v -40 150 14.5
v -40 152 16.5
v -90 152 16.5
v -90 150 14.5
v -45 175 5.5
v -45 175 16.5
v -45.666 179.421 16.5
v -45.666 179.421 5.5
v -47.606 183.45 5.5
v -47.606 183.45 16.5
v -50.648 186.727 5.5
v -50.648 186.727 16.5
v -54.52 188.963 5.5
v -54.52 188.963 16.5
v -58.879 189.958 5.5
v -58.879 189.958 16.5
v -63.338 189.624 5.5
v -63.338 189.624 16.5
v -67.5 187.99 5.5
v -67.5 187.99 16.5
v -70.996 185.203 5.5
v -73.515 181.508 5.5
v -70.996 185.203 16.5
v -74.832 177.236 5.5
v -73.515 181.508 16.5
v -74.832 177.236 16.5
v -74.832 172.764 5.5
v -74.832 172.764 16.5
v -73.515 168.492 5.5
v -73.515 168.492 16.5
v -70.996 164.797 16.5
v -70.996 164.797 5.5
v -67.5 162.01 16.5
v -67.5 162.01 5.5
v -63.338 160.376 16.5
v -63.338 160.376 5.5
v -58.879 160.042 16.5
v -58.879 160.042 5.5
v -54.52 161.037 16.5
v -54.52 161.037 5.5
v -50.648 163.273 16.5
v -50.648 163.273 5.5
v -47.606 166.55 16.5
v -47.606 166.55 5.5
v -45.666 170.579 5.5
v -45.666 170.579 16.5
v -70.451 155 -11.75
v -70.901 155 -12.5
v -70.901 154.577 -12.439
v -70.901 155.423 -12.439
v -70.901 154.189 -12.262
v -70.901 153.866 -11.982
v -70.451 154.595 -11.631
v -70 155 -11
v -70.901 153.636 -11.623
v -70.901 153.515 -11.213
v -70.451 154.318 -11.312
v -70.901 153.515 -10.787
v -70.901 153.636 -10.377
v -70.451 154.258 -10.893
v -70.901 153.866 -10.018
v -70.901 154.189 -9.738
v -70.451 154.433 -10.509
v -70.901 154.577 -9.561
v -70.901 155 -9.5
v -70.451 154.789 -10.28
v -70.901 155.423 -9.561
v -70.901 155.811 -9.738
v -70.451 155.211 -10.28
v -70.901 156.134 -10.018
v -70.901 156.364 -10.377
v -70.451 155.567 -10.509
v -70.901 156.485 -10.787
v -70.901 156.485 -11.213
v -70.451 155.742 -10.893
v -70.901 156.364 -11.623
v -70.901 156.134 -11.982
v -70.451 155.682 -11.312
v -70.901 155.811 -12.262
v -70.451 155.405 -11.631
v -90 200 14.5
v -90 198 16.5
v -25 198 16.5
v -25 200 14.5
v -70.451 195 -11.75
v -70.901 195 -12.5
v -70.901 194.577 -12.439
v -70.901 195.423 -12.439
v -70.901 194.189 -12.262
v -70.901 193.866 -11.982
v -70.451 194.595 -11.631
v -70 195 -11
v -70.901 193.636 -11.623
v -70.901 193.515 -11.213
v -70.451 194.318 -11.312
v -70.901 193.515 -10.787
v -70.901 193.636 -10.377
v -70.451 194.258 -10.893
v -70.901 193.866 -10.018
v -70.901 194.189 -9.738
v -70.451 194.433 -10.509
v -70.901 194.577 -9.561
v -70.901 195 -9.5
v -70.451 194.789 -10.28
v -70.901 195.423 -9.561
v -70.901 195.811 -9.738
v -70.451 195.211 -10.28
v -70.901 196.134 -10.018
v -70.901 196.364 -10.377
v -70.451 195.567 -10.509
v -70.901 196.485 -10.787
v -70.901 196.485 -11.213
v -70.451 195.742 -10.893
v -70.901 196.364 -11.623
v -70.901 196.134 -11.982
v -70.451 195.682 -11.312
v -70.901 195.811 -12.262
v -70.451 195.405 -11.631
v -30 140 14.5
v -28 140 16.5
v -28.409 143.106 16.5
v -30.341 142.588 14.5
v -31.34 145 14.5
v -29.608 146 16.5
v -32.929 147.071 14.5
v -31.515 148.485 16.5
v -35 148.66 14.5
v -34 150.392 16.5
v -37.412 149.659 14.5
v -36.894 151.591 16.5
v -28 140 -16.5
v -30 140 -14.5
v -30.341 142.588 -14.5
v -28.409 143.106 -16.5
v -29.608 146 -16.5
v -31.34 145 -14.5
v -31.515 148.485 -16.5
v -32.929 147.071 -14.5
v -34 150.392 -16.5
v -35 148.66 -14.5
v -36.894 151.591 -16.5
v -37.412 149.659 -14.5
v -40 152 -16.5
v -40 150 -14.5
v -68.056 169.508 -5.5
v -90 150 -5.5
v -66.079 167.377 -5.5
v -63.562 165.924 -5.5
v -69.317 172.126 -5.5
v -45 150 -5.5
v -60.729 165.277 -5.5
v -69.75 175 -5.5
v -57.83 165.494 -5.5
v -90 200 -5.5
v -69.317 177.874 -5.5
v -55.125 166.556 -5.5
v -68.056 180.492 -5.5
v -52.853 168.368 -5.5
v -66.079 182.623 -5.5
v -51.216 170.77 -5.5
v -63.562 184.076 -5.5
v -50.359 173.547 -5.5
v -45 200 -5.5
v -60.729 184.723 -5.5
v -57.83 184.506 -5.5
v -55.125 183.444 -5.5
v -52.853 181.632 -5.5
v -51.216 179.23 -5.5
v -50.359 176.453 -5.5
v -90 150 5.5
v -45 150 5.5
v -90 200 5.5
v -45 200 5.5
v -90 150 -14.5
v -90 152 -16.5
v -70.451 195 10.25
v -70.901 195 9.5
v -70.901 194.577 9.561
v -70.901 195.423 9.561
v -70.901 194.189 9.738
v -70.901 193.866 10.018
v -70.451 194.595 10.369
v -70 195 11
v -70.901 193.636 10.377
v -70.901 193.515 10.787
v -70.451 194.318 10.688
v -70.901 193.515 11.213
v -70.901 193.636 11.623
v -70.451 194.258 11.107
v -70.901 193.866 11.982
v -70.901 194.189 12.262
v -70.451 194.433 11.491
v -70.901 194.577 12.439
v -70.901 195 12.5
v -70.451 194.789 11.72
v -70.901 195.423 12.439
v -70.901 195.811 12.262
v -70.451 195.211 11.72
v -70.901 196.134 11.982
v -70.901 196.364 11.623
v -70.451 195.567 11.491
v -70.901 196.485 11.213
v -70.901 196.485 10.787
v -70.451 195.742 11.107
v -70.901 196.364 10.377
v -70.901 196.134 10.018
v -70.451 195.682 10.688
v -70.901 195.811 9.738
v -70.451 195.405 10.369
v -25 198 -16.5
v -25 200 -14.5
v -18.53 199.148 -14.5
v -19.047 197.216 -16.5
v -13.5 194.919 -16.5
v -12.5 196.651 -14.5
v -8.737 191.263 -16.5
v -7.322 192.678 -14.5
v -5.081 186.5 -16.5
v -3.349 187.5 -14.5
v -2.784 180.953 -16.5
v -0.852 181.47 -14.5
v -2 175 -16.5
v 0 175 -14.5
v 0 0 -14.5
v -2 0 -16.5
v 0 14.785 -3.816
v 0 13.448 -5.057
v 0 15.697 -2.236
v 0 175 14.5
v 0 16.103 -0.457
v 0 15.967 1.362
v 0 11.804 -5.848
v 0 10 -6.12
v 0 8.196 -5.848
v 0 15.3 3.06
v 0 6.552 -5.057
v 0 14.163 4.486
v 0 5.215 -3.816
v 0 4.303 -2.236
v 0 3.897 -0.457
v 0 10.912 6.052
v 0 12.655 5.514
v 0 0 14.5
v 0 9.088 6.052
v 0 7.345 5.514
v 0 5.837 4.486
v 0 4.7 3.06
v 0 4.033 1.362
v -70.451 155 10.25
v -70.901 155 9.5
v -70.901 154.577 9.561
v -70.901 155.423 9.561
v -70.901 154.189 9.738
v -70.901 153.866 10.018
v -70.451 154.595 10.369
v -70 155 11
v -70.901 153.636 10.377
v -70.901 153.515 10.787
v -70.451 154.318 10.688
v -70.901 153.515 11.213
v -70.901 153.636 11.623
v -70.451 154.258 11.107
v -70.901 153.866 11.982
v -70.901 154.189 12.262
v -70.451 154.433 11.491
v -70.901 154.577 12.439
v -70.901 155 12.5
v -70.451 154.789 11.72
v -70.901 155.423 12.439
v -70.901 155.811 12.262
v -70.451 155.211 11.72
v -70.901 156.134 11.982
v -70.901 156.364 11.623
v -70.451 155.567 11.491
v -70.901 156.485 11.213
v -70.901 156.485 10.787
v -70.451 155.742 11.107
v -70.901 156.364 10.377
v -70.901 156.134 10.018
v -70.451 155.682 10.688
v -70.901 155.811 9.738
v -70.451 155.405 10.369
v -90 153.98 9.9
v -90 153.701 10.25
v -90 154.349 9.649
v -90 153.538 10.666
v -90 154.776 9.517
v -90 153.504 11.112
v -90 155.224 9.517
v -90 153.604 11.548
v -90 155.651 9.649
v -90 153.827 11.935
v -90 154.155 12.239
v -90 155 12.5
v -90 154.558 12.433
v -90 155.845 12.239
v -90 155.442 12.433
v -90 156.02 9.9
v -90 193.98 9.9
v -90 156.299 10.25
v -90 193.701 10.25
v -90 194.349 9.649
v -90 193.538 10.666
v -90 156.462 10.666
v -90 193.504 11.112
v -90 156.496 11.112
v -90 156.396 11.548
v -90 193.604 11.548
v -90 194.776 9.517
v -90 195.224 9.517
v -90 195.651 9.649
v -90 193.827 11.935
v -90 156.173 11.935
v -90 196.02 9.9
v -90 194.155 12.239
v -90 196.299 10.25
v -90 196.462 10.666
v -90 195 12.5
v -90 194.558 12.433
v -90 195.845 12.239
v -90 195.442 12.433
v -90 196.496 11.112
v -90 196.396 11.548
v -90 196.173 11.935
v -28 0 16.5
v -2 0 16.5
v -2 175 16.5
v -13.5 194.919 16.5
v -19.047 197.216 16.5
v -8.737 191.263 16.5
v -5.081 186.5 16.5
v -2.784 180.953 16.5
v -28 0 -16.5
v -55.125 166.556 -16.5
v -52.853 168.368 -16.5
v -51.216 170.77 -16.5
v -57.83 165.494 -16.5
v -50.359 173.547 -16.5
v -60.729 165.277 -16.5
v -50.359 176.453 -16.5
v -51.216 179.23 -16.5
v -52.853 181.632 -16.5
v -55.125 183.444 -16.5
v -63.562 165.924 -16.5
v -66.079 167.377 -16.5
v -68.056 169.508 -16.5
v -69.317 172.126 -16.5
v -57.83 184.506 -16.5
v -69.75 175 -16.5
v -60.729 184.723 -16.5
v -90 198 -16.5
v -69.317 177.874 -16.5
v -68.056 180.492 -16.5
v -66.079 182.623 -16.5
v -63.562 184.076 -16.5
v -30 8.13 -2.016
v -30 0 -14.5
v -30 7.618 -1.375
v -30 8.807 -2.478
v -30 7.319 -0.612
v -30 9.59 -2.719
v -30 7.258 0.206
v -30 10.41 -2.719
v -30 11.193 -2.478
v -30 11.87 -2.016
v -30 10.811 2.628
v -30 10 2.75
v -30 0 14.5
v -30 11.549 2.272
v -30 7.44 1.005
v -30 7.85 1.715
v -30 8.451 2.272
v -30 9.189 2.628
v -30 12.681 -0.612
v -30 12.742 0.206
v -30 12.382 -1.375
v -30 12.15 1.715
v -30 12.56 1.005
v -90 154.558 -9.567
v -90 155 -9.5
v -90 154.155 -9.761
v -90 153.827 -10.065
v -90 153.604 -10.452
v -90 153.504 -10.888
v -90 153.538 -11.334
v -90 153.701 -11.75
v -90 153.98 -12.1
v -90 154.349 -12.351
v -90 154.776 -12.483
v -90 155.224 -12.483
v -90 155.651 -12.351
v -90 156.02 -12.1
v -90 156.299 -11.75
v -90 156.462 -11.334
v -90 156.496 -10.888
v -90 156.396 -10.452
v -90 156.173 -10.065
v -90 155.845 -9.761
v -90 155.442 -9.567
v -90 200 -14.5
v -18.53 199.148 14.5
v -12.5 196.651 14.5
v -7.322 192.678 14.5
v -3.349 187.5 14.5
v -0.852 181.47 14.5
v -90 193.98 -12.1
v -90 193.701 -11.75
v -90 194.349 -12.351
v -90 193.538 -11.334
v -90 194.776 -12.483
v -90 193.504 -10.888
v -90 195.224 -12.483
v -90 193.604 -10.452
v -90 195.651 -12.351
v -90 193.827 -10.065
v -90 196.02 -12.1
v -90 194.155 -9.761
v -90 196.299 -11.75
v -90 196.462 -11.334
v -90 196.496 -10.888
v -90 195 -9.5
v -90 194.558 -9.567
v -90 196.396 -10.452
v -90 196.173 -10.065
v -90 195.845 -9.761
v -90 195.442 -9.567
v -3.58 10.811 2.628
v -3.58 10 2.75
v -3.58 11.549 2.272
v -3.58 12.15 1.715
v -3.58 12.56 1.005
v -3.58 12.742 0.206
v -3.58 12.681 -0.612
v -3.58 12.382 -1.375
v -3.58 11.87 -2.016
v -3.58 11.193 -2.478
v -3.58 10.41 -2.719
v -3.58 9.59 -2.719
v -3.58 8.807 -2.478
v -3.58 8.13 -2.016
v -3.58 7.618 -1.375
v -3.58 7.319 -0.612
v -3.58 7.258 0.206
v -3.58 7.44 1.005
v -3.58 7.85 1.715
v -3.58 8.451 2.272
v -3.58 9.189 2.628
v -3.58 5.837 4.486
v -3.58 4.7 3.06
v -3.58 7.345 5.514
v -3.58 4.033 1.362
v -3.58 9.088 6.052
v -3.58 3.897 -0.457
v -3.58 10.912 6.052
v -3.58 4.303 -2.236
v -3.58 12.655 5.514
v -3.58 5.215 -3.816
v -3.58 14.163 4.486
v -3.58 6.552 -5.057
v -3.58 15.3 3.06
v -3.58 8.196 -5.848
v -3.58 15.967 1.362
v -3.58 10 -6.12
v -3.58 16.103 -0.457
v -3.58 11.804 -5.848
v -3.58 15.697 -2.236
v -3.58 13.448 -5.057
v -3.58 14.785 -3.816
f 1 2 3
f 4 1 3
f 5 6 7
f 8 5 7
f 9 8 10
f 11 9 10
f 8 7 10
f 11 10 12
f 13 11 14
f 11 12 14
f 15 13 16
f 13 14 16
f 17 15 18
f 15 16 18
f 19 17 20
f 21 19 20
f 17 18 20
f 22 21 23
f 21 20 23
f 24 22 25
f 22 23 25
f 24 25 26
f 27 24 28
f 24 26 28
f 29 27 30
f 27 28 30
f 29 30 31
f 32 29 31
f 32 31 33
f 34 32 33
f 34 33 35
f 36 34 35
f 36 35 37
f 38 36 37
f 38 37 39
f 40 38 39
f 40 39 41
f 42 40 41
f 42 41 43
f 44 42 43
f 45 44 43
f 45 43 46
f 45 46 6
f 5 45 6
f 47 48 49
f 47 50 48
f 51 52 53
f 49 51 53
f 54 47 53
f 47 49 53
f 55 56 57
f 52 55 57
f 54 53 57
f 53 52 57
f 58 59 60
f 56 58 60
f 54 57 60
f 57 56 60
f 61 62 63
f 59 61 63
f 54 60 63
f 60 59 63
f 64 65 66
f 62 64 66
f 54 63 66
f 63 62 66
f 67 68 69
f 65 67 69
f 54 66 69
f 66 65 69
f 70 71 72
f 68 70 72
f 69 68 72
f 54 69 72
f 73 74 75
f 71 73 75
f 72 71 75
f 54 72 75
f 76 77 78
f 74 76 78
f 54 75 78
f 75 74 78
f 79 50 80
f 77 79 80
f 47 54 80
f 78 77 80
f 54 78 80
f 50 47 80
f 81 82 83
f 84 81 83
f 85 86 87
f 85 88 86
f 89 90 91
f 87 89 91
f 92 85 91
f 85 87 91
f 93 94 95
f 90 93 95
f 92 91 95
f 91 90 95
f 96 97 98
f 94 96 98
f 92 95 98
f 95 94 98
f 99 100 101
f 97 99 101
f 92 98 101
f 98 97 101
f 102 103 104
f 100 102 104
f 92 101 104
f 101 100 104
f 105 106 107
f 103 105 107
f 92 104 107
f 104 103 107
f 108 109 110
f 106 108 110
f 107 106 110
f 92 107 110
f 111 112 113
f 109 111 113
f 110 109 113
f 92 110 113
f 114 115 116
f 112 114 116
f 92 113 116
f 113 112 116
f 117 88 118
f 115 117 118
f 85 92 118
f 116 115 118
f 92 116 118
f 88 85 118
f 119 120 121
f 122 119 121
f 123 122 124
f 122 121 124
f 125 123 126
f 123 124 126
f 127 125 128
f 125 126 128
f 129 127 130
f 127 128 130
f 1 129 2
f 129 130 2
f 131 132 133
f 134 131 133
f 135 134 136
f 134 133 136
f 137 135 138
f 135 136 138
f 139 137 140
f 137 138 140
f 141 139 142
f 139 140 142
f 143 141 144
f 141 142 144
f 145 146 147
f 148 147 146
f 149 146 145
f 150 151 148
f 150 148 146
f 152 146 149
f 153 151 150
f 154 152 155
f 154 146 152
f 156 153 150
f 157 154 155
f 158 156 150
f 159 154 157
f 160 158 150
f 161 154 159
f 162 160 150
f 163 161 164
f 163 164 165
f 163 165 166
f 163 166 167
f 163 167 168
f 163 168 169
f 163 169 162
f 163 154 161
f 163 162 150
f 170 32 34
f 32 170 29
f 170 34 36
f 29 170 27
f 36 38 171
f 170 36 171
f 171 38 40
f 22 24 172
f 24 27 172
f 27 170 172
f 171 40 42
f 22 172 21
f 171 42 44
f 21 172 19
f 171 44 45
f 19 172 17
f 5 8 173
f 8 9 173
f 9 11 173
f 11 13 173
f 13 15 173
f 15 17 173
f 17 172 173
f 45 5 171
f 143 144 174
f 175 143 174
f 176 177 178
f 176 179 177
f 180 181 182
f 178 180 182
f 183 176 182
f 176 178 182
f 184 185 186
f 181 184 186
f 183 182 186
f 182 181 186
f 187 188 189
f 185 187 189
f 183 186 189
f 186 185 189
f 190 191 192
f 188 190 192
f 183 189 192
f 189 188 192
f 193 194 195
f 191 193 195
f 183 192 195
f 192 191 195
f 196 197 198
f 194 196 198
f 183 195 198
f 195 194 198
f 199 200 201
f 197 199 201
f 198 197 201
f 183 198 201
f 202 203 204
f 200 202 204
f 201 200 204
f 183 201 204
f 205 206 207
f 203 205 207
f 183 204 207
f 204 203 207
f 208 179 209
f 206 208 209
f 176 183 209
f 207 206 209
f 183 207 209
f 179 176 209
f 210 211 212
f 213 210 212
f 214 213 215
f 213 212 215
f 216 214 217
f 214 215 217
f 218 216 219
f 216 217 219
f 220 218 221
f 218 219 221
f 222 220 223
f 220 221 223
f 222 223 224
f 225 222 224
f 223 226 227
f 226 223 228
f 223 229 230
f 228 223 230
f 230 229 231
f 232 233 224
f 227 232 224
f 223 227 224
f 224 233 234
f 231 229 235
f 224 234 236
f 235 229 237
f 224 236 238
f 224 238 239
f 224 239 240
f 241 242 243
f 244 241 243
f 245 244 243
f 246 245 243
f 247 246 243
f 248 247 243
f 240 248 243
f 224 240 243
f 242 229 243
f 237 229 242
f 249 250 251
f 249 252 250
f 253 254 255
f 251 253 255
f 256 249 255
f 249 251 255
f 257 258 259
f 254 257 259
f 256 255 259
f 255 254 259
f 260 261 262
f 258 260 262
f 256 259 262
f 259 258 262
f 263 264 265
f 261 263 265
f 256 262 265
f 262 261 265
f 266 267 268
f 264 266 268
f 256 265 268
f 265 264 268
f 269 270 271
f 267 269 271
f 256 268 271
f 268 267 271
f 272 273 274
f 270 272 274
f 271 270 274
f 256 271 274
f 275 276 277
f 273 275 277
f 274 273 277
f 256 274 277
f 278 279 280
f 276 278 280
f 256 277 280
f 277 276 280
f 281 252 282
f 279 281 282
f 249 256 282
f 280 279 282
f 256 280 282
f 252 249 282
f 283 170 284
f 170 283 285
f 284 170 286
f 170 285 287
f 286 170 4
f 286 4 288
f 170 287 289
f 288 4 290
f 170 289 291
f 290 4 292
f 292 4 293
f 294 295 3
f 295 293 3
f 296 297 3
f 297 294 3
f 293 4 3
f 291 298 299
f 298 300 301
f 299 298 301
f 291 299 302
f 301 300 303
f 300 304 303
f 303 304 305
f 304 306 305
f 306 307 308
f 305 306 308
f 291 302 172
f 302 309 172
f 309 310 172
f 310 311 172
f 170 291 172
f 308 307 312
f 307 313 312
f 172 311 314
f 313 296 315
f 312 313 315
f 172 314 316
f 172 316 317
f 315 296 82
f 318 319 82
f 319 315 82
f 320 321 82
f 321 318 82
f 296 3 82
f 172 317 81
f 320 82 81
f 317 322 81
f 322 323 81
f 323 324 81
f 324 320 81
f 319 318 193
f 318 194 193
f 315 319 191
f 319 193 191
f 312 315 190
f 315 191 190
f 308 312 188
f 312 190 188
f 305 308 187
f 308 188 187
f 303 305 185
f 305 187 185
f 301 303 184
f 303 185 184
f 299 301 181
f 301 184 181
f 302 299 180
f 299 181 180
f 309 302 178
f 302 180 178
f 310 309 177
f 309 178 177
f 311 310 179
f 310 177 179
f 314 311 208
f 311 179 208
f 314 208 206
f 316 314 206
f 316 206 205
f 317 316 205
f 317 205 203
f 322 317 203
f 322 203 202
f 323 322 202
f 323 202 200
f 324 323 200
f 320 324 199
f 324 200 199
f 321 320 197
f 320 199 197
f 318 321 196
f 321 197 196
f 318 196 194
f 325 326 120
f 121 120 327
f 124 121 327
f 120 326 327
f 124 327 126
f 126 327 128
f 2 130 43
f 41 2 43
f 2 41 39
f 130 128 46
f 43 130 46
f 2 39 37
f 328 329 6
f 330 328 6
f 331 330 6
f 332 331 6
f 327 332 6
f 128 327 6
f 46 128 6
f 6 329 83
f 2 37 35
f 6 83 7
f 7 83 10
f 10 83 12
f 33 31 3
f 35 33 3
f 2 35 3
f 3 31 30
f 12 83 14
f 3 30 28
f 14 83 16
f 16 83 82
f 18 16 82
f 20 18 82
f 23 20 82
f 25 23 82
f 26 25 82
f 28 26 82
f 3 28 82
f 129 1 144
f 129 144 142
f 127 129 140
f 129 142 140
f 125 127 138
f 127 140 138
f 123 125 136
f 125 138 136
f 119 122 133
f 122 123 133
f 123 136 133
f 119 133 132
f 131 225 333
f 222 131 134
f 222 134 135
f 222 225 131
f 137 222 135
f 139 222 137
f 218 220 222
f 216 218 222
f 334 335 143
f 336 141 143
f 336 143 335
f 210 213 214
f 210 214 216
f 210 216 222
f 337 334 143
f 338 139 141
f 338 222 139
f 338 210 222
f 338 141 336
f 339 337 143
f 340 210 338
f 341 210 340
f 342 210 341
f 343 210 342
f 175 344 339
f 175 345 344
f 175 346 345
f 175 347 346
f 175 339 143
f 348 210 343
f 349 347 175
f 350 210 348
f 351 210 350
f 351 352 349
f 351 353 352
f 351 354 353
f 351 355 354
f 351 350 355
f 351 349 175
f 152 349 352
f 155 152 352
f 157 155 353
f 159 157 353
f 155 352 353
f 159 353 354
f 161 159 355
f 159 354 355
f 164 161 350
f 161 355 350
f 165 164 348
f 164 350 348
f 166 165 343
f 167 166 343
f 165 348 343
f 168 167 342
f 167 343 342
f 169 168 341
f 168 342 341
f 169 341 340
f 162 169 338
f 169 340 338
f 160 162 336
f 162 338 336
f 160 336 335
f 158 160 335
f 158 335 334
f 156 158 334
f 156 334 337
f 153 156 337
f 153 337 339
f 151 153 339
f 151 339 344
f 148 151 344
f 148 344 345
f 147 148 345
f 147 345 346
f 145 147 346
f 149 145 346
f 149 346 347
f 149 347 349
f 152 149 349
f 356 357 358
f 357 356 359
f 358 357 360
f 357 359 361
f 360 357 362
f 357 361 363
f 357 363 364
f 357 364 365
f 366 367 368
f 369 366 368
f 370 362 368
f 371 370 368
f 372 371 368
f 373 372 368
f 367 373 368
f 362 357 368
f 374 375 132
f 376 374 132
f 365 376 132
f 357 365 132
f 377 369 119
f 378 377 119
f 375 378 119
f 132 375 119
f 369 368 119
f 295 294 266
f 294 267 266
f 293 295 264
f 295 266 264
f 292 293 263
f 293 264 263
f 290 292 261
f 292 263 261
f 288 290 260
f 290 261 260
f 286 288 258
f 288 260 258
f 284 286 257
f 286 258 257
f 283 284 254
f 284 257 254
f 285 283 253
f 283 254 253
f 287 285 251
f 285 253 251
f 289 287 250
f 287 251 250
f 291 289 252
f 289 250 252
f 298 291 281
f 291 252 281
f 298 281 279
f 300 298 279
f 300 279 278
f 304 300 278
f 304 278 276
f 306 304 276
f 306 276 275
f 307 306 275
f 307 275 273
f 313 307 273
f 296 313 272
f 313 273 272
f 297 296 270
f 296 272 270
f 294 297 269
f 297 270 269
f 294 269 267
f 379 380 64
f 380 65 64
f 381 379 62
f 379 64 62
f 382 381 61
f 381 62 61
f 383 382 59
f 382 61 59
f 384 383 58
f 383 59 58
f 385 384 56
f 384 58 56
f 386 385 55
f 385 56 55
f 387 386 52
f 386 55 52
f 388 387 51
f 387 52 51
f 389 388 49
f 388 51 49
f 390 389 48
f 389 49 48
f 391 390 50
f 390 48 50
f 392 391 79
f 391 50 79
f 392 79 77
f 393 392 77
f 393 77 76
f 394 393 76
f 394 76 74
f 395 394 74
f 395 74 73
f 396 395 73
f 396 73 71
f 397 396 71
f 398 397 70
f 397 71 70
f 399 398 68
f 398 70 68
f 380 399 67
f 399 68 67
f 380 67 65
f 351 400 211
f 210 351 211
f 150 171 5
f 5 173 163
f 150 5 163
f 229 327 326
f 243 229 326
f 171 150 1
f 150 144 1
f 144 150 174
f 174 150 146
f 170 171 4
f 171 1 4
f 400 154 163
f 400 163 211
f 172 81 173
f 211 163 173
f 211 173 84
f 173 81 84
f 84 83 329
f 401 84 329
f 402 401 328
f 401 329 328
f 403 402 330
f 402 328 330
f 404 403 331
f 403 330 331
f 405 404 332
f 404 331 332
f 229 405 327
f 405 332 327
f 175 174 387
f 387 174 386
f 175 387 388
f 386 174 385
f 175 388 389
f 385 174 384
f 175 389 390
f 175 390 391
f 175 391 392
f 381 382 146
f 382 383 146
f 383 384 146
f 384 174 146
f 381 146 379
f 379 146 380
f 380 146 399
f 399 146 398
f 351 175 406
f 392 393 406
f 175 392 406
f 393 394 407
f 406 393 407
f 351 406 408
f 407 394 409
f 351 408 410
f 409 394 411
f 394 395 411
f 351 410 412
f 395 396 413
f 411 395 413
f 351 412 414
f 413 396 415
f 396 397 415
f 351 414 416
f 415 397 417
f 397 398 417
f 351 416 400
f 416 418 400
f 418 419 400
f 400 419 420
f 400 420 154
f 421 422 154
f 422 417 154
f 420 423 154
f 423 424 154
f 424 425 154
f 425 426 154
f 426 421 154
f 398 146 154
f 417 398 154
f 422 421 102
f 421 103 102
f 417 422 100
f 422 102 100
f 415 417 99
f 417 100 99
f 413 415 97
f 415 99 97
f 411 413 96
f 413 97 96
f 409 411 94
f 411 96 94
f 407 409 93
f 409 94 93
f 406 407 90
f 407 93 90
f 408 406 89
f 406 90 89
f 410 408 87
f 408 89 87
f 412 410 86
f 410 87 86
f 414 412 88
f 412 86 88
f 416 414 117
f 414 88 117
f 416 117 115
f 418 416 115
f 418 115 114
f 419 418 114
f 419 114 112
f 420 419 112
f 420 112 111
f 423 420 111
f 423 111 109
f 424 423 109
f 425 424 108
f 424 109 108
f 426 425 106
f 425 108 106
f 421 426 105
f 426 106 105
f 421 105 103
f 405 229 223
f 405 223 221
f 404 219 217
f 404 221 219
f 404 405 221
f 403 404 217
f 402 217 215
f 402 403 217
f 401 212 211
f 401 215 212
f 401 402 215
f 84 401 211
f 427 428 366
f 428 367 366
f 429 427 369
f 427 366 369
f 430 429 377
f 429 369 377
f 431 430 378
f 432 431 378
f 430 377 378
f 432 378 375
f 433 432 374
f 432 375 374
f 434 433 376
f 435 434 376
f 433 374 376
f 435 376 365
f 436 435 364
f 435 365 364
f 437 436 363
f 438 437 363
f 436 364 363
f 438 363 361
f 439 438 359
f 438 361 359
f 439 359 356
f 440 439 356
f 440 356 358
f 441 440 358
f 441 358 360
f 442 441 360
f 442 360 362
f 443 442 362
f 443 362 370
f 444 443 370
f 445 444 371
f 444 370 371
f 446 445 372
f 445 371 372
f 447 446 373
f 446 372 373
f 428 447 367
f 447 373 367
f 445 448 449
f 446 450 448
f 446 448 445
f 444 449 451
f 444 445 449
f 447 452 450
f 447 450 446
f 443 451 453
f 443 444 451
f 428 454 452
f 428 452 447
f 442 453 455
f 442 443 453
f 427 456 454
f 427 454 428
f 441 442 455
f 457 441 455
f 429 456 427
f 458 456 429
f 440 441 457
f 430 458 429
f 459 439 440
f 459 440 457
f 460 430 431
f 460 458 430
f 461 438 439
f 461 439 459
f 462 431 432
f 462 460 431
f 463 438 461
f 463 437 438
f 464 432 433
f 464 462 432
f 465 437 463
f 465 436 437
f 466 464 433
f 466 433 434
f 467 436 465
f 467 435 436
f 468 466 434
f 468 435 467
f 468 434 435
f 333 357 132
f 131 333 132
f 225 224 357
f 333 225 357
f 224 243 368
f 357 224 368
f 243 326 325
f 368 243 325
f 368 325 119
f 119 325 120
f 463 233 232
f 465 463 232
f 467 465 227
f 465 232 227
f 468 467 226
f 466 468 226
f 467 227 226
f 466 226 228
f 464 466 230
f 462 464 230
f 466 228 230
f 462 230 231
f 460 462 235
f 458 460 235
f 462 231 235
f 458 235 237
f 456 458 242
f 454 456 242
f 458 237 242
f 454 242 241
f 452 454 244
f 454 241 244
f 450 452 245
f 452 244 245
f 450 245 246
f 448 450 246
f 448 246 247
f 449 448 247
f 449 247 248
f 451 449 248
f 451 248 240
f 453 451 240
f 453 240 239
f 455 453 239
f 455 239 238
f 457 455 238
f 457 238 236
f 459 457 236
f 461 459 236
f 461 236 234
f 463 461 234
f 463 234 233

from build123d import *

# Parameters (mm, degrees)
BOSS_EXTRUDE1_DEPTH                     = 16.5
CUT_EXTRUDE1_REACH                      = 221.937
SKETCH3_W                               = 45
SKETCH3_H                               = 11
FILLET1_R                               = 25
FILLET2_R                               = 10
CUT_EXTRUDE2_REACH                      = 223.786
SKETCH4_R                               = 15
CUT_EXTRUDE3_REACH                      = 223.786
SKETCH5_R                               = 9.75
F_3_0MM_DOWEL_HOLE1_D                   = 3
F_3_0MM_DOWEL_HOLE1_DEPTH               = 19.098709071
F_3_0MM_DOWEL_HOLE1_TIP                 = 0.901290929
CHAMFER1_SIZE                           = 2
CBORE_FOR_M5_HEX_HEAD_BOLT1_D           = 5.5
CBORE_FOR_M5_HEX_HEAD_BOLT1_CBORE_D     = 12.24
CBORE_FOR_M5_HEX_HEAD_BOLT1_CBORE_DEPTH = 3.58


with BuildPart() as part:
    # Sketch1 → Boss-Extrude1 (new, symmetric)
    with BuildSketch(Plane.XY):
        Polygon((0, 0), (-30, 0), (-30, 150), (-90, 150), (-90, 200), (0, 200), align=None)
    extrude(amount=BOSS_EXTRUDE1_DEPTH, both=True)

    # Sketch3 → Cut-Extrude1 (cut, up to next)
    with BuildSketch(Plane(origin=(0, 200, 0), x_dir=(1, 0, 0), z_dir=(0, 1, 0)), mode=Mode.PRIVATE) as cut_extrude1_sk1:
        with Locations((-67.5, 0)):
            Rectangle(SKETCH3_W, SKETCH3_H)
    cut_extrude1_tool1 = extrude(cut_extrude1_sk1.sketch, amount=-CUT_EXTRUDE1_REACH, mode=Mode.PRIVATE) & part.part
    add(cut_extrude1_tool1.solids().sort_by_distance((-67.5, 200, 0))[0], mode=Mode.SUBTRACT)

    # Fillet1
    fillet1_edges = [part.edges().sort_by_distance(p)[0] for p in [
        (0, 200, 0),
    ]]
    fillet(fillet1_edges, radius=FILLET1_R)

    # Fillet2
    fillet2_edges = [part.edges().sort_by_distance(p)[0] for p in [
        (-30, 150, 0),
    ]]
    fillet(fillet2_edges, radius=FILLET2_R)

    # Sketch4 → Cut-Extrude2 (cut, up to next)
    with BuildSketch(Plane.XY.offset(16.5), mode=Mode.PRIVATE) as cut_extrude2_sk1:
        with Locations((-60, 175)):
            Circle(SKETCH4_R)
    cut_extrude2_tool1 = extrude(cut_extrude2_sk1.sketch, amount=-CUT_EXTRUDE2_REACH, mode=Mode.PRIVATE) & part.part
    add(cut_extrude2_tool1.solids().sort_by_distance((-60, 175, 16.5))[0], mode=Mode.SUBTRACT)

    # Sketch5 → Cut-Extrude3 (cut, up to next)
    with BuildSketch(Plane(origin=(0, 0, -16.5), x_dir=(-1, 0, 0), z_dir=(0, 0, -1)), mode=Mode.PRIVATE) as cut_extrude3_sk1:
        with Locations((60, 175)):
            Circle(SKETCH5_R)
    cut_extrude3_tool1 = extrude(cut_extrude3_sk1.sketch, amount=-CUT_EXTRUDE3_REACH, mode=Mode.PRIVATE) & part.part
    add(cut_extrude3_tool1.solids().sort_by_distance((-60, 175, -16.5))[0], mode=Mode.SUBTRACT)

    # Ø3.0mm Dowel Hole1
    with Locations(Plane(origin=(-90, 195, -11), x_dir=(0, 0, -1), z_dir=(-1, 0, 0))):
        with Locations((0, 0), (0, 40), (-22, 0), (-22, 40)):
            Hole(F_3_0MM_DOWEL_HOLE1_D / 2, depth=F_3_0MM_DOWEL_HOLE1_DEPTH)
            with Locations((0, 0, -(F_3_0MM_DOWEL_HOLE1_DEPTH + F_3_0MM_DOWEL_HOLE1_TIP / 2))):  # 118° drill point
                Cone(0, F_3_0MM_DOWEL_HOLE1_D / 2, F_3_0MM_DOWEL_HOLE1_TIP, mode=Mode.SUBTRACT)

    # Chamfer1
    chamfer1_edges = [part.edges().sort_by_distance(p)[0] for p in [
        (-65, 150, -16.5),
        (-57.5, 200, 16.5),
        (-7.32233047, 192.67766953, 16.5),
        (-57.5, 200, -16.5),
        (-7.32233047, 192.67766953, -16.5),
        (-30, 70, 16.5),
        (-30, 70, -16.5),
        (-32.928932188, 147.071067812, 16.5),
        (-32.928932188, 147.071067812, -16.5),
        (0, 87.5, -16.5),
        (-65, 150, 16.5),
        (0, 87.5, 16.5),
    ]]
    chamfer(chamfer1_edges, length=CHAMFER1_SIZE)

    # CBORE for M5 Hex Head Bolt1 (through all)
    with Locations(Plane(origin=(0, 0, 0), x_dir=(0, 0, -1), z_dir=(1, 0, 0))):
        with Locations((0, 10)):
            CounterBoreHole(CBORE_FOR_M5_HEX_HEAD_BOLT1_D / 2, CBORE_FOR_M5_HEX_HEAD_BOLT1_CBORE_D / 2, CBORE_FOR_M5_HEX_HEAD_BOLT1_CBORE_DEPTH)


solid = part.part
